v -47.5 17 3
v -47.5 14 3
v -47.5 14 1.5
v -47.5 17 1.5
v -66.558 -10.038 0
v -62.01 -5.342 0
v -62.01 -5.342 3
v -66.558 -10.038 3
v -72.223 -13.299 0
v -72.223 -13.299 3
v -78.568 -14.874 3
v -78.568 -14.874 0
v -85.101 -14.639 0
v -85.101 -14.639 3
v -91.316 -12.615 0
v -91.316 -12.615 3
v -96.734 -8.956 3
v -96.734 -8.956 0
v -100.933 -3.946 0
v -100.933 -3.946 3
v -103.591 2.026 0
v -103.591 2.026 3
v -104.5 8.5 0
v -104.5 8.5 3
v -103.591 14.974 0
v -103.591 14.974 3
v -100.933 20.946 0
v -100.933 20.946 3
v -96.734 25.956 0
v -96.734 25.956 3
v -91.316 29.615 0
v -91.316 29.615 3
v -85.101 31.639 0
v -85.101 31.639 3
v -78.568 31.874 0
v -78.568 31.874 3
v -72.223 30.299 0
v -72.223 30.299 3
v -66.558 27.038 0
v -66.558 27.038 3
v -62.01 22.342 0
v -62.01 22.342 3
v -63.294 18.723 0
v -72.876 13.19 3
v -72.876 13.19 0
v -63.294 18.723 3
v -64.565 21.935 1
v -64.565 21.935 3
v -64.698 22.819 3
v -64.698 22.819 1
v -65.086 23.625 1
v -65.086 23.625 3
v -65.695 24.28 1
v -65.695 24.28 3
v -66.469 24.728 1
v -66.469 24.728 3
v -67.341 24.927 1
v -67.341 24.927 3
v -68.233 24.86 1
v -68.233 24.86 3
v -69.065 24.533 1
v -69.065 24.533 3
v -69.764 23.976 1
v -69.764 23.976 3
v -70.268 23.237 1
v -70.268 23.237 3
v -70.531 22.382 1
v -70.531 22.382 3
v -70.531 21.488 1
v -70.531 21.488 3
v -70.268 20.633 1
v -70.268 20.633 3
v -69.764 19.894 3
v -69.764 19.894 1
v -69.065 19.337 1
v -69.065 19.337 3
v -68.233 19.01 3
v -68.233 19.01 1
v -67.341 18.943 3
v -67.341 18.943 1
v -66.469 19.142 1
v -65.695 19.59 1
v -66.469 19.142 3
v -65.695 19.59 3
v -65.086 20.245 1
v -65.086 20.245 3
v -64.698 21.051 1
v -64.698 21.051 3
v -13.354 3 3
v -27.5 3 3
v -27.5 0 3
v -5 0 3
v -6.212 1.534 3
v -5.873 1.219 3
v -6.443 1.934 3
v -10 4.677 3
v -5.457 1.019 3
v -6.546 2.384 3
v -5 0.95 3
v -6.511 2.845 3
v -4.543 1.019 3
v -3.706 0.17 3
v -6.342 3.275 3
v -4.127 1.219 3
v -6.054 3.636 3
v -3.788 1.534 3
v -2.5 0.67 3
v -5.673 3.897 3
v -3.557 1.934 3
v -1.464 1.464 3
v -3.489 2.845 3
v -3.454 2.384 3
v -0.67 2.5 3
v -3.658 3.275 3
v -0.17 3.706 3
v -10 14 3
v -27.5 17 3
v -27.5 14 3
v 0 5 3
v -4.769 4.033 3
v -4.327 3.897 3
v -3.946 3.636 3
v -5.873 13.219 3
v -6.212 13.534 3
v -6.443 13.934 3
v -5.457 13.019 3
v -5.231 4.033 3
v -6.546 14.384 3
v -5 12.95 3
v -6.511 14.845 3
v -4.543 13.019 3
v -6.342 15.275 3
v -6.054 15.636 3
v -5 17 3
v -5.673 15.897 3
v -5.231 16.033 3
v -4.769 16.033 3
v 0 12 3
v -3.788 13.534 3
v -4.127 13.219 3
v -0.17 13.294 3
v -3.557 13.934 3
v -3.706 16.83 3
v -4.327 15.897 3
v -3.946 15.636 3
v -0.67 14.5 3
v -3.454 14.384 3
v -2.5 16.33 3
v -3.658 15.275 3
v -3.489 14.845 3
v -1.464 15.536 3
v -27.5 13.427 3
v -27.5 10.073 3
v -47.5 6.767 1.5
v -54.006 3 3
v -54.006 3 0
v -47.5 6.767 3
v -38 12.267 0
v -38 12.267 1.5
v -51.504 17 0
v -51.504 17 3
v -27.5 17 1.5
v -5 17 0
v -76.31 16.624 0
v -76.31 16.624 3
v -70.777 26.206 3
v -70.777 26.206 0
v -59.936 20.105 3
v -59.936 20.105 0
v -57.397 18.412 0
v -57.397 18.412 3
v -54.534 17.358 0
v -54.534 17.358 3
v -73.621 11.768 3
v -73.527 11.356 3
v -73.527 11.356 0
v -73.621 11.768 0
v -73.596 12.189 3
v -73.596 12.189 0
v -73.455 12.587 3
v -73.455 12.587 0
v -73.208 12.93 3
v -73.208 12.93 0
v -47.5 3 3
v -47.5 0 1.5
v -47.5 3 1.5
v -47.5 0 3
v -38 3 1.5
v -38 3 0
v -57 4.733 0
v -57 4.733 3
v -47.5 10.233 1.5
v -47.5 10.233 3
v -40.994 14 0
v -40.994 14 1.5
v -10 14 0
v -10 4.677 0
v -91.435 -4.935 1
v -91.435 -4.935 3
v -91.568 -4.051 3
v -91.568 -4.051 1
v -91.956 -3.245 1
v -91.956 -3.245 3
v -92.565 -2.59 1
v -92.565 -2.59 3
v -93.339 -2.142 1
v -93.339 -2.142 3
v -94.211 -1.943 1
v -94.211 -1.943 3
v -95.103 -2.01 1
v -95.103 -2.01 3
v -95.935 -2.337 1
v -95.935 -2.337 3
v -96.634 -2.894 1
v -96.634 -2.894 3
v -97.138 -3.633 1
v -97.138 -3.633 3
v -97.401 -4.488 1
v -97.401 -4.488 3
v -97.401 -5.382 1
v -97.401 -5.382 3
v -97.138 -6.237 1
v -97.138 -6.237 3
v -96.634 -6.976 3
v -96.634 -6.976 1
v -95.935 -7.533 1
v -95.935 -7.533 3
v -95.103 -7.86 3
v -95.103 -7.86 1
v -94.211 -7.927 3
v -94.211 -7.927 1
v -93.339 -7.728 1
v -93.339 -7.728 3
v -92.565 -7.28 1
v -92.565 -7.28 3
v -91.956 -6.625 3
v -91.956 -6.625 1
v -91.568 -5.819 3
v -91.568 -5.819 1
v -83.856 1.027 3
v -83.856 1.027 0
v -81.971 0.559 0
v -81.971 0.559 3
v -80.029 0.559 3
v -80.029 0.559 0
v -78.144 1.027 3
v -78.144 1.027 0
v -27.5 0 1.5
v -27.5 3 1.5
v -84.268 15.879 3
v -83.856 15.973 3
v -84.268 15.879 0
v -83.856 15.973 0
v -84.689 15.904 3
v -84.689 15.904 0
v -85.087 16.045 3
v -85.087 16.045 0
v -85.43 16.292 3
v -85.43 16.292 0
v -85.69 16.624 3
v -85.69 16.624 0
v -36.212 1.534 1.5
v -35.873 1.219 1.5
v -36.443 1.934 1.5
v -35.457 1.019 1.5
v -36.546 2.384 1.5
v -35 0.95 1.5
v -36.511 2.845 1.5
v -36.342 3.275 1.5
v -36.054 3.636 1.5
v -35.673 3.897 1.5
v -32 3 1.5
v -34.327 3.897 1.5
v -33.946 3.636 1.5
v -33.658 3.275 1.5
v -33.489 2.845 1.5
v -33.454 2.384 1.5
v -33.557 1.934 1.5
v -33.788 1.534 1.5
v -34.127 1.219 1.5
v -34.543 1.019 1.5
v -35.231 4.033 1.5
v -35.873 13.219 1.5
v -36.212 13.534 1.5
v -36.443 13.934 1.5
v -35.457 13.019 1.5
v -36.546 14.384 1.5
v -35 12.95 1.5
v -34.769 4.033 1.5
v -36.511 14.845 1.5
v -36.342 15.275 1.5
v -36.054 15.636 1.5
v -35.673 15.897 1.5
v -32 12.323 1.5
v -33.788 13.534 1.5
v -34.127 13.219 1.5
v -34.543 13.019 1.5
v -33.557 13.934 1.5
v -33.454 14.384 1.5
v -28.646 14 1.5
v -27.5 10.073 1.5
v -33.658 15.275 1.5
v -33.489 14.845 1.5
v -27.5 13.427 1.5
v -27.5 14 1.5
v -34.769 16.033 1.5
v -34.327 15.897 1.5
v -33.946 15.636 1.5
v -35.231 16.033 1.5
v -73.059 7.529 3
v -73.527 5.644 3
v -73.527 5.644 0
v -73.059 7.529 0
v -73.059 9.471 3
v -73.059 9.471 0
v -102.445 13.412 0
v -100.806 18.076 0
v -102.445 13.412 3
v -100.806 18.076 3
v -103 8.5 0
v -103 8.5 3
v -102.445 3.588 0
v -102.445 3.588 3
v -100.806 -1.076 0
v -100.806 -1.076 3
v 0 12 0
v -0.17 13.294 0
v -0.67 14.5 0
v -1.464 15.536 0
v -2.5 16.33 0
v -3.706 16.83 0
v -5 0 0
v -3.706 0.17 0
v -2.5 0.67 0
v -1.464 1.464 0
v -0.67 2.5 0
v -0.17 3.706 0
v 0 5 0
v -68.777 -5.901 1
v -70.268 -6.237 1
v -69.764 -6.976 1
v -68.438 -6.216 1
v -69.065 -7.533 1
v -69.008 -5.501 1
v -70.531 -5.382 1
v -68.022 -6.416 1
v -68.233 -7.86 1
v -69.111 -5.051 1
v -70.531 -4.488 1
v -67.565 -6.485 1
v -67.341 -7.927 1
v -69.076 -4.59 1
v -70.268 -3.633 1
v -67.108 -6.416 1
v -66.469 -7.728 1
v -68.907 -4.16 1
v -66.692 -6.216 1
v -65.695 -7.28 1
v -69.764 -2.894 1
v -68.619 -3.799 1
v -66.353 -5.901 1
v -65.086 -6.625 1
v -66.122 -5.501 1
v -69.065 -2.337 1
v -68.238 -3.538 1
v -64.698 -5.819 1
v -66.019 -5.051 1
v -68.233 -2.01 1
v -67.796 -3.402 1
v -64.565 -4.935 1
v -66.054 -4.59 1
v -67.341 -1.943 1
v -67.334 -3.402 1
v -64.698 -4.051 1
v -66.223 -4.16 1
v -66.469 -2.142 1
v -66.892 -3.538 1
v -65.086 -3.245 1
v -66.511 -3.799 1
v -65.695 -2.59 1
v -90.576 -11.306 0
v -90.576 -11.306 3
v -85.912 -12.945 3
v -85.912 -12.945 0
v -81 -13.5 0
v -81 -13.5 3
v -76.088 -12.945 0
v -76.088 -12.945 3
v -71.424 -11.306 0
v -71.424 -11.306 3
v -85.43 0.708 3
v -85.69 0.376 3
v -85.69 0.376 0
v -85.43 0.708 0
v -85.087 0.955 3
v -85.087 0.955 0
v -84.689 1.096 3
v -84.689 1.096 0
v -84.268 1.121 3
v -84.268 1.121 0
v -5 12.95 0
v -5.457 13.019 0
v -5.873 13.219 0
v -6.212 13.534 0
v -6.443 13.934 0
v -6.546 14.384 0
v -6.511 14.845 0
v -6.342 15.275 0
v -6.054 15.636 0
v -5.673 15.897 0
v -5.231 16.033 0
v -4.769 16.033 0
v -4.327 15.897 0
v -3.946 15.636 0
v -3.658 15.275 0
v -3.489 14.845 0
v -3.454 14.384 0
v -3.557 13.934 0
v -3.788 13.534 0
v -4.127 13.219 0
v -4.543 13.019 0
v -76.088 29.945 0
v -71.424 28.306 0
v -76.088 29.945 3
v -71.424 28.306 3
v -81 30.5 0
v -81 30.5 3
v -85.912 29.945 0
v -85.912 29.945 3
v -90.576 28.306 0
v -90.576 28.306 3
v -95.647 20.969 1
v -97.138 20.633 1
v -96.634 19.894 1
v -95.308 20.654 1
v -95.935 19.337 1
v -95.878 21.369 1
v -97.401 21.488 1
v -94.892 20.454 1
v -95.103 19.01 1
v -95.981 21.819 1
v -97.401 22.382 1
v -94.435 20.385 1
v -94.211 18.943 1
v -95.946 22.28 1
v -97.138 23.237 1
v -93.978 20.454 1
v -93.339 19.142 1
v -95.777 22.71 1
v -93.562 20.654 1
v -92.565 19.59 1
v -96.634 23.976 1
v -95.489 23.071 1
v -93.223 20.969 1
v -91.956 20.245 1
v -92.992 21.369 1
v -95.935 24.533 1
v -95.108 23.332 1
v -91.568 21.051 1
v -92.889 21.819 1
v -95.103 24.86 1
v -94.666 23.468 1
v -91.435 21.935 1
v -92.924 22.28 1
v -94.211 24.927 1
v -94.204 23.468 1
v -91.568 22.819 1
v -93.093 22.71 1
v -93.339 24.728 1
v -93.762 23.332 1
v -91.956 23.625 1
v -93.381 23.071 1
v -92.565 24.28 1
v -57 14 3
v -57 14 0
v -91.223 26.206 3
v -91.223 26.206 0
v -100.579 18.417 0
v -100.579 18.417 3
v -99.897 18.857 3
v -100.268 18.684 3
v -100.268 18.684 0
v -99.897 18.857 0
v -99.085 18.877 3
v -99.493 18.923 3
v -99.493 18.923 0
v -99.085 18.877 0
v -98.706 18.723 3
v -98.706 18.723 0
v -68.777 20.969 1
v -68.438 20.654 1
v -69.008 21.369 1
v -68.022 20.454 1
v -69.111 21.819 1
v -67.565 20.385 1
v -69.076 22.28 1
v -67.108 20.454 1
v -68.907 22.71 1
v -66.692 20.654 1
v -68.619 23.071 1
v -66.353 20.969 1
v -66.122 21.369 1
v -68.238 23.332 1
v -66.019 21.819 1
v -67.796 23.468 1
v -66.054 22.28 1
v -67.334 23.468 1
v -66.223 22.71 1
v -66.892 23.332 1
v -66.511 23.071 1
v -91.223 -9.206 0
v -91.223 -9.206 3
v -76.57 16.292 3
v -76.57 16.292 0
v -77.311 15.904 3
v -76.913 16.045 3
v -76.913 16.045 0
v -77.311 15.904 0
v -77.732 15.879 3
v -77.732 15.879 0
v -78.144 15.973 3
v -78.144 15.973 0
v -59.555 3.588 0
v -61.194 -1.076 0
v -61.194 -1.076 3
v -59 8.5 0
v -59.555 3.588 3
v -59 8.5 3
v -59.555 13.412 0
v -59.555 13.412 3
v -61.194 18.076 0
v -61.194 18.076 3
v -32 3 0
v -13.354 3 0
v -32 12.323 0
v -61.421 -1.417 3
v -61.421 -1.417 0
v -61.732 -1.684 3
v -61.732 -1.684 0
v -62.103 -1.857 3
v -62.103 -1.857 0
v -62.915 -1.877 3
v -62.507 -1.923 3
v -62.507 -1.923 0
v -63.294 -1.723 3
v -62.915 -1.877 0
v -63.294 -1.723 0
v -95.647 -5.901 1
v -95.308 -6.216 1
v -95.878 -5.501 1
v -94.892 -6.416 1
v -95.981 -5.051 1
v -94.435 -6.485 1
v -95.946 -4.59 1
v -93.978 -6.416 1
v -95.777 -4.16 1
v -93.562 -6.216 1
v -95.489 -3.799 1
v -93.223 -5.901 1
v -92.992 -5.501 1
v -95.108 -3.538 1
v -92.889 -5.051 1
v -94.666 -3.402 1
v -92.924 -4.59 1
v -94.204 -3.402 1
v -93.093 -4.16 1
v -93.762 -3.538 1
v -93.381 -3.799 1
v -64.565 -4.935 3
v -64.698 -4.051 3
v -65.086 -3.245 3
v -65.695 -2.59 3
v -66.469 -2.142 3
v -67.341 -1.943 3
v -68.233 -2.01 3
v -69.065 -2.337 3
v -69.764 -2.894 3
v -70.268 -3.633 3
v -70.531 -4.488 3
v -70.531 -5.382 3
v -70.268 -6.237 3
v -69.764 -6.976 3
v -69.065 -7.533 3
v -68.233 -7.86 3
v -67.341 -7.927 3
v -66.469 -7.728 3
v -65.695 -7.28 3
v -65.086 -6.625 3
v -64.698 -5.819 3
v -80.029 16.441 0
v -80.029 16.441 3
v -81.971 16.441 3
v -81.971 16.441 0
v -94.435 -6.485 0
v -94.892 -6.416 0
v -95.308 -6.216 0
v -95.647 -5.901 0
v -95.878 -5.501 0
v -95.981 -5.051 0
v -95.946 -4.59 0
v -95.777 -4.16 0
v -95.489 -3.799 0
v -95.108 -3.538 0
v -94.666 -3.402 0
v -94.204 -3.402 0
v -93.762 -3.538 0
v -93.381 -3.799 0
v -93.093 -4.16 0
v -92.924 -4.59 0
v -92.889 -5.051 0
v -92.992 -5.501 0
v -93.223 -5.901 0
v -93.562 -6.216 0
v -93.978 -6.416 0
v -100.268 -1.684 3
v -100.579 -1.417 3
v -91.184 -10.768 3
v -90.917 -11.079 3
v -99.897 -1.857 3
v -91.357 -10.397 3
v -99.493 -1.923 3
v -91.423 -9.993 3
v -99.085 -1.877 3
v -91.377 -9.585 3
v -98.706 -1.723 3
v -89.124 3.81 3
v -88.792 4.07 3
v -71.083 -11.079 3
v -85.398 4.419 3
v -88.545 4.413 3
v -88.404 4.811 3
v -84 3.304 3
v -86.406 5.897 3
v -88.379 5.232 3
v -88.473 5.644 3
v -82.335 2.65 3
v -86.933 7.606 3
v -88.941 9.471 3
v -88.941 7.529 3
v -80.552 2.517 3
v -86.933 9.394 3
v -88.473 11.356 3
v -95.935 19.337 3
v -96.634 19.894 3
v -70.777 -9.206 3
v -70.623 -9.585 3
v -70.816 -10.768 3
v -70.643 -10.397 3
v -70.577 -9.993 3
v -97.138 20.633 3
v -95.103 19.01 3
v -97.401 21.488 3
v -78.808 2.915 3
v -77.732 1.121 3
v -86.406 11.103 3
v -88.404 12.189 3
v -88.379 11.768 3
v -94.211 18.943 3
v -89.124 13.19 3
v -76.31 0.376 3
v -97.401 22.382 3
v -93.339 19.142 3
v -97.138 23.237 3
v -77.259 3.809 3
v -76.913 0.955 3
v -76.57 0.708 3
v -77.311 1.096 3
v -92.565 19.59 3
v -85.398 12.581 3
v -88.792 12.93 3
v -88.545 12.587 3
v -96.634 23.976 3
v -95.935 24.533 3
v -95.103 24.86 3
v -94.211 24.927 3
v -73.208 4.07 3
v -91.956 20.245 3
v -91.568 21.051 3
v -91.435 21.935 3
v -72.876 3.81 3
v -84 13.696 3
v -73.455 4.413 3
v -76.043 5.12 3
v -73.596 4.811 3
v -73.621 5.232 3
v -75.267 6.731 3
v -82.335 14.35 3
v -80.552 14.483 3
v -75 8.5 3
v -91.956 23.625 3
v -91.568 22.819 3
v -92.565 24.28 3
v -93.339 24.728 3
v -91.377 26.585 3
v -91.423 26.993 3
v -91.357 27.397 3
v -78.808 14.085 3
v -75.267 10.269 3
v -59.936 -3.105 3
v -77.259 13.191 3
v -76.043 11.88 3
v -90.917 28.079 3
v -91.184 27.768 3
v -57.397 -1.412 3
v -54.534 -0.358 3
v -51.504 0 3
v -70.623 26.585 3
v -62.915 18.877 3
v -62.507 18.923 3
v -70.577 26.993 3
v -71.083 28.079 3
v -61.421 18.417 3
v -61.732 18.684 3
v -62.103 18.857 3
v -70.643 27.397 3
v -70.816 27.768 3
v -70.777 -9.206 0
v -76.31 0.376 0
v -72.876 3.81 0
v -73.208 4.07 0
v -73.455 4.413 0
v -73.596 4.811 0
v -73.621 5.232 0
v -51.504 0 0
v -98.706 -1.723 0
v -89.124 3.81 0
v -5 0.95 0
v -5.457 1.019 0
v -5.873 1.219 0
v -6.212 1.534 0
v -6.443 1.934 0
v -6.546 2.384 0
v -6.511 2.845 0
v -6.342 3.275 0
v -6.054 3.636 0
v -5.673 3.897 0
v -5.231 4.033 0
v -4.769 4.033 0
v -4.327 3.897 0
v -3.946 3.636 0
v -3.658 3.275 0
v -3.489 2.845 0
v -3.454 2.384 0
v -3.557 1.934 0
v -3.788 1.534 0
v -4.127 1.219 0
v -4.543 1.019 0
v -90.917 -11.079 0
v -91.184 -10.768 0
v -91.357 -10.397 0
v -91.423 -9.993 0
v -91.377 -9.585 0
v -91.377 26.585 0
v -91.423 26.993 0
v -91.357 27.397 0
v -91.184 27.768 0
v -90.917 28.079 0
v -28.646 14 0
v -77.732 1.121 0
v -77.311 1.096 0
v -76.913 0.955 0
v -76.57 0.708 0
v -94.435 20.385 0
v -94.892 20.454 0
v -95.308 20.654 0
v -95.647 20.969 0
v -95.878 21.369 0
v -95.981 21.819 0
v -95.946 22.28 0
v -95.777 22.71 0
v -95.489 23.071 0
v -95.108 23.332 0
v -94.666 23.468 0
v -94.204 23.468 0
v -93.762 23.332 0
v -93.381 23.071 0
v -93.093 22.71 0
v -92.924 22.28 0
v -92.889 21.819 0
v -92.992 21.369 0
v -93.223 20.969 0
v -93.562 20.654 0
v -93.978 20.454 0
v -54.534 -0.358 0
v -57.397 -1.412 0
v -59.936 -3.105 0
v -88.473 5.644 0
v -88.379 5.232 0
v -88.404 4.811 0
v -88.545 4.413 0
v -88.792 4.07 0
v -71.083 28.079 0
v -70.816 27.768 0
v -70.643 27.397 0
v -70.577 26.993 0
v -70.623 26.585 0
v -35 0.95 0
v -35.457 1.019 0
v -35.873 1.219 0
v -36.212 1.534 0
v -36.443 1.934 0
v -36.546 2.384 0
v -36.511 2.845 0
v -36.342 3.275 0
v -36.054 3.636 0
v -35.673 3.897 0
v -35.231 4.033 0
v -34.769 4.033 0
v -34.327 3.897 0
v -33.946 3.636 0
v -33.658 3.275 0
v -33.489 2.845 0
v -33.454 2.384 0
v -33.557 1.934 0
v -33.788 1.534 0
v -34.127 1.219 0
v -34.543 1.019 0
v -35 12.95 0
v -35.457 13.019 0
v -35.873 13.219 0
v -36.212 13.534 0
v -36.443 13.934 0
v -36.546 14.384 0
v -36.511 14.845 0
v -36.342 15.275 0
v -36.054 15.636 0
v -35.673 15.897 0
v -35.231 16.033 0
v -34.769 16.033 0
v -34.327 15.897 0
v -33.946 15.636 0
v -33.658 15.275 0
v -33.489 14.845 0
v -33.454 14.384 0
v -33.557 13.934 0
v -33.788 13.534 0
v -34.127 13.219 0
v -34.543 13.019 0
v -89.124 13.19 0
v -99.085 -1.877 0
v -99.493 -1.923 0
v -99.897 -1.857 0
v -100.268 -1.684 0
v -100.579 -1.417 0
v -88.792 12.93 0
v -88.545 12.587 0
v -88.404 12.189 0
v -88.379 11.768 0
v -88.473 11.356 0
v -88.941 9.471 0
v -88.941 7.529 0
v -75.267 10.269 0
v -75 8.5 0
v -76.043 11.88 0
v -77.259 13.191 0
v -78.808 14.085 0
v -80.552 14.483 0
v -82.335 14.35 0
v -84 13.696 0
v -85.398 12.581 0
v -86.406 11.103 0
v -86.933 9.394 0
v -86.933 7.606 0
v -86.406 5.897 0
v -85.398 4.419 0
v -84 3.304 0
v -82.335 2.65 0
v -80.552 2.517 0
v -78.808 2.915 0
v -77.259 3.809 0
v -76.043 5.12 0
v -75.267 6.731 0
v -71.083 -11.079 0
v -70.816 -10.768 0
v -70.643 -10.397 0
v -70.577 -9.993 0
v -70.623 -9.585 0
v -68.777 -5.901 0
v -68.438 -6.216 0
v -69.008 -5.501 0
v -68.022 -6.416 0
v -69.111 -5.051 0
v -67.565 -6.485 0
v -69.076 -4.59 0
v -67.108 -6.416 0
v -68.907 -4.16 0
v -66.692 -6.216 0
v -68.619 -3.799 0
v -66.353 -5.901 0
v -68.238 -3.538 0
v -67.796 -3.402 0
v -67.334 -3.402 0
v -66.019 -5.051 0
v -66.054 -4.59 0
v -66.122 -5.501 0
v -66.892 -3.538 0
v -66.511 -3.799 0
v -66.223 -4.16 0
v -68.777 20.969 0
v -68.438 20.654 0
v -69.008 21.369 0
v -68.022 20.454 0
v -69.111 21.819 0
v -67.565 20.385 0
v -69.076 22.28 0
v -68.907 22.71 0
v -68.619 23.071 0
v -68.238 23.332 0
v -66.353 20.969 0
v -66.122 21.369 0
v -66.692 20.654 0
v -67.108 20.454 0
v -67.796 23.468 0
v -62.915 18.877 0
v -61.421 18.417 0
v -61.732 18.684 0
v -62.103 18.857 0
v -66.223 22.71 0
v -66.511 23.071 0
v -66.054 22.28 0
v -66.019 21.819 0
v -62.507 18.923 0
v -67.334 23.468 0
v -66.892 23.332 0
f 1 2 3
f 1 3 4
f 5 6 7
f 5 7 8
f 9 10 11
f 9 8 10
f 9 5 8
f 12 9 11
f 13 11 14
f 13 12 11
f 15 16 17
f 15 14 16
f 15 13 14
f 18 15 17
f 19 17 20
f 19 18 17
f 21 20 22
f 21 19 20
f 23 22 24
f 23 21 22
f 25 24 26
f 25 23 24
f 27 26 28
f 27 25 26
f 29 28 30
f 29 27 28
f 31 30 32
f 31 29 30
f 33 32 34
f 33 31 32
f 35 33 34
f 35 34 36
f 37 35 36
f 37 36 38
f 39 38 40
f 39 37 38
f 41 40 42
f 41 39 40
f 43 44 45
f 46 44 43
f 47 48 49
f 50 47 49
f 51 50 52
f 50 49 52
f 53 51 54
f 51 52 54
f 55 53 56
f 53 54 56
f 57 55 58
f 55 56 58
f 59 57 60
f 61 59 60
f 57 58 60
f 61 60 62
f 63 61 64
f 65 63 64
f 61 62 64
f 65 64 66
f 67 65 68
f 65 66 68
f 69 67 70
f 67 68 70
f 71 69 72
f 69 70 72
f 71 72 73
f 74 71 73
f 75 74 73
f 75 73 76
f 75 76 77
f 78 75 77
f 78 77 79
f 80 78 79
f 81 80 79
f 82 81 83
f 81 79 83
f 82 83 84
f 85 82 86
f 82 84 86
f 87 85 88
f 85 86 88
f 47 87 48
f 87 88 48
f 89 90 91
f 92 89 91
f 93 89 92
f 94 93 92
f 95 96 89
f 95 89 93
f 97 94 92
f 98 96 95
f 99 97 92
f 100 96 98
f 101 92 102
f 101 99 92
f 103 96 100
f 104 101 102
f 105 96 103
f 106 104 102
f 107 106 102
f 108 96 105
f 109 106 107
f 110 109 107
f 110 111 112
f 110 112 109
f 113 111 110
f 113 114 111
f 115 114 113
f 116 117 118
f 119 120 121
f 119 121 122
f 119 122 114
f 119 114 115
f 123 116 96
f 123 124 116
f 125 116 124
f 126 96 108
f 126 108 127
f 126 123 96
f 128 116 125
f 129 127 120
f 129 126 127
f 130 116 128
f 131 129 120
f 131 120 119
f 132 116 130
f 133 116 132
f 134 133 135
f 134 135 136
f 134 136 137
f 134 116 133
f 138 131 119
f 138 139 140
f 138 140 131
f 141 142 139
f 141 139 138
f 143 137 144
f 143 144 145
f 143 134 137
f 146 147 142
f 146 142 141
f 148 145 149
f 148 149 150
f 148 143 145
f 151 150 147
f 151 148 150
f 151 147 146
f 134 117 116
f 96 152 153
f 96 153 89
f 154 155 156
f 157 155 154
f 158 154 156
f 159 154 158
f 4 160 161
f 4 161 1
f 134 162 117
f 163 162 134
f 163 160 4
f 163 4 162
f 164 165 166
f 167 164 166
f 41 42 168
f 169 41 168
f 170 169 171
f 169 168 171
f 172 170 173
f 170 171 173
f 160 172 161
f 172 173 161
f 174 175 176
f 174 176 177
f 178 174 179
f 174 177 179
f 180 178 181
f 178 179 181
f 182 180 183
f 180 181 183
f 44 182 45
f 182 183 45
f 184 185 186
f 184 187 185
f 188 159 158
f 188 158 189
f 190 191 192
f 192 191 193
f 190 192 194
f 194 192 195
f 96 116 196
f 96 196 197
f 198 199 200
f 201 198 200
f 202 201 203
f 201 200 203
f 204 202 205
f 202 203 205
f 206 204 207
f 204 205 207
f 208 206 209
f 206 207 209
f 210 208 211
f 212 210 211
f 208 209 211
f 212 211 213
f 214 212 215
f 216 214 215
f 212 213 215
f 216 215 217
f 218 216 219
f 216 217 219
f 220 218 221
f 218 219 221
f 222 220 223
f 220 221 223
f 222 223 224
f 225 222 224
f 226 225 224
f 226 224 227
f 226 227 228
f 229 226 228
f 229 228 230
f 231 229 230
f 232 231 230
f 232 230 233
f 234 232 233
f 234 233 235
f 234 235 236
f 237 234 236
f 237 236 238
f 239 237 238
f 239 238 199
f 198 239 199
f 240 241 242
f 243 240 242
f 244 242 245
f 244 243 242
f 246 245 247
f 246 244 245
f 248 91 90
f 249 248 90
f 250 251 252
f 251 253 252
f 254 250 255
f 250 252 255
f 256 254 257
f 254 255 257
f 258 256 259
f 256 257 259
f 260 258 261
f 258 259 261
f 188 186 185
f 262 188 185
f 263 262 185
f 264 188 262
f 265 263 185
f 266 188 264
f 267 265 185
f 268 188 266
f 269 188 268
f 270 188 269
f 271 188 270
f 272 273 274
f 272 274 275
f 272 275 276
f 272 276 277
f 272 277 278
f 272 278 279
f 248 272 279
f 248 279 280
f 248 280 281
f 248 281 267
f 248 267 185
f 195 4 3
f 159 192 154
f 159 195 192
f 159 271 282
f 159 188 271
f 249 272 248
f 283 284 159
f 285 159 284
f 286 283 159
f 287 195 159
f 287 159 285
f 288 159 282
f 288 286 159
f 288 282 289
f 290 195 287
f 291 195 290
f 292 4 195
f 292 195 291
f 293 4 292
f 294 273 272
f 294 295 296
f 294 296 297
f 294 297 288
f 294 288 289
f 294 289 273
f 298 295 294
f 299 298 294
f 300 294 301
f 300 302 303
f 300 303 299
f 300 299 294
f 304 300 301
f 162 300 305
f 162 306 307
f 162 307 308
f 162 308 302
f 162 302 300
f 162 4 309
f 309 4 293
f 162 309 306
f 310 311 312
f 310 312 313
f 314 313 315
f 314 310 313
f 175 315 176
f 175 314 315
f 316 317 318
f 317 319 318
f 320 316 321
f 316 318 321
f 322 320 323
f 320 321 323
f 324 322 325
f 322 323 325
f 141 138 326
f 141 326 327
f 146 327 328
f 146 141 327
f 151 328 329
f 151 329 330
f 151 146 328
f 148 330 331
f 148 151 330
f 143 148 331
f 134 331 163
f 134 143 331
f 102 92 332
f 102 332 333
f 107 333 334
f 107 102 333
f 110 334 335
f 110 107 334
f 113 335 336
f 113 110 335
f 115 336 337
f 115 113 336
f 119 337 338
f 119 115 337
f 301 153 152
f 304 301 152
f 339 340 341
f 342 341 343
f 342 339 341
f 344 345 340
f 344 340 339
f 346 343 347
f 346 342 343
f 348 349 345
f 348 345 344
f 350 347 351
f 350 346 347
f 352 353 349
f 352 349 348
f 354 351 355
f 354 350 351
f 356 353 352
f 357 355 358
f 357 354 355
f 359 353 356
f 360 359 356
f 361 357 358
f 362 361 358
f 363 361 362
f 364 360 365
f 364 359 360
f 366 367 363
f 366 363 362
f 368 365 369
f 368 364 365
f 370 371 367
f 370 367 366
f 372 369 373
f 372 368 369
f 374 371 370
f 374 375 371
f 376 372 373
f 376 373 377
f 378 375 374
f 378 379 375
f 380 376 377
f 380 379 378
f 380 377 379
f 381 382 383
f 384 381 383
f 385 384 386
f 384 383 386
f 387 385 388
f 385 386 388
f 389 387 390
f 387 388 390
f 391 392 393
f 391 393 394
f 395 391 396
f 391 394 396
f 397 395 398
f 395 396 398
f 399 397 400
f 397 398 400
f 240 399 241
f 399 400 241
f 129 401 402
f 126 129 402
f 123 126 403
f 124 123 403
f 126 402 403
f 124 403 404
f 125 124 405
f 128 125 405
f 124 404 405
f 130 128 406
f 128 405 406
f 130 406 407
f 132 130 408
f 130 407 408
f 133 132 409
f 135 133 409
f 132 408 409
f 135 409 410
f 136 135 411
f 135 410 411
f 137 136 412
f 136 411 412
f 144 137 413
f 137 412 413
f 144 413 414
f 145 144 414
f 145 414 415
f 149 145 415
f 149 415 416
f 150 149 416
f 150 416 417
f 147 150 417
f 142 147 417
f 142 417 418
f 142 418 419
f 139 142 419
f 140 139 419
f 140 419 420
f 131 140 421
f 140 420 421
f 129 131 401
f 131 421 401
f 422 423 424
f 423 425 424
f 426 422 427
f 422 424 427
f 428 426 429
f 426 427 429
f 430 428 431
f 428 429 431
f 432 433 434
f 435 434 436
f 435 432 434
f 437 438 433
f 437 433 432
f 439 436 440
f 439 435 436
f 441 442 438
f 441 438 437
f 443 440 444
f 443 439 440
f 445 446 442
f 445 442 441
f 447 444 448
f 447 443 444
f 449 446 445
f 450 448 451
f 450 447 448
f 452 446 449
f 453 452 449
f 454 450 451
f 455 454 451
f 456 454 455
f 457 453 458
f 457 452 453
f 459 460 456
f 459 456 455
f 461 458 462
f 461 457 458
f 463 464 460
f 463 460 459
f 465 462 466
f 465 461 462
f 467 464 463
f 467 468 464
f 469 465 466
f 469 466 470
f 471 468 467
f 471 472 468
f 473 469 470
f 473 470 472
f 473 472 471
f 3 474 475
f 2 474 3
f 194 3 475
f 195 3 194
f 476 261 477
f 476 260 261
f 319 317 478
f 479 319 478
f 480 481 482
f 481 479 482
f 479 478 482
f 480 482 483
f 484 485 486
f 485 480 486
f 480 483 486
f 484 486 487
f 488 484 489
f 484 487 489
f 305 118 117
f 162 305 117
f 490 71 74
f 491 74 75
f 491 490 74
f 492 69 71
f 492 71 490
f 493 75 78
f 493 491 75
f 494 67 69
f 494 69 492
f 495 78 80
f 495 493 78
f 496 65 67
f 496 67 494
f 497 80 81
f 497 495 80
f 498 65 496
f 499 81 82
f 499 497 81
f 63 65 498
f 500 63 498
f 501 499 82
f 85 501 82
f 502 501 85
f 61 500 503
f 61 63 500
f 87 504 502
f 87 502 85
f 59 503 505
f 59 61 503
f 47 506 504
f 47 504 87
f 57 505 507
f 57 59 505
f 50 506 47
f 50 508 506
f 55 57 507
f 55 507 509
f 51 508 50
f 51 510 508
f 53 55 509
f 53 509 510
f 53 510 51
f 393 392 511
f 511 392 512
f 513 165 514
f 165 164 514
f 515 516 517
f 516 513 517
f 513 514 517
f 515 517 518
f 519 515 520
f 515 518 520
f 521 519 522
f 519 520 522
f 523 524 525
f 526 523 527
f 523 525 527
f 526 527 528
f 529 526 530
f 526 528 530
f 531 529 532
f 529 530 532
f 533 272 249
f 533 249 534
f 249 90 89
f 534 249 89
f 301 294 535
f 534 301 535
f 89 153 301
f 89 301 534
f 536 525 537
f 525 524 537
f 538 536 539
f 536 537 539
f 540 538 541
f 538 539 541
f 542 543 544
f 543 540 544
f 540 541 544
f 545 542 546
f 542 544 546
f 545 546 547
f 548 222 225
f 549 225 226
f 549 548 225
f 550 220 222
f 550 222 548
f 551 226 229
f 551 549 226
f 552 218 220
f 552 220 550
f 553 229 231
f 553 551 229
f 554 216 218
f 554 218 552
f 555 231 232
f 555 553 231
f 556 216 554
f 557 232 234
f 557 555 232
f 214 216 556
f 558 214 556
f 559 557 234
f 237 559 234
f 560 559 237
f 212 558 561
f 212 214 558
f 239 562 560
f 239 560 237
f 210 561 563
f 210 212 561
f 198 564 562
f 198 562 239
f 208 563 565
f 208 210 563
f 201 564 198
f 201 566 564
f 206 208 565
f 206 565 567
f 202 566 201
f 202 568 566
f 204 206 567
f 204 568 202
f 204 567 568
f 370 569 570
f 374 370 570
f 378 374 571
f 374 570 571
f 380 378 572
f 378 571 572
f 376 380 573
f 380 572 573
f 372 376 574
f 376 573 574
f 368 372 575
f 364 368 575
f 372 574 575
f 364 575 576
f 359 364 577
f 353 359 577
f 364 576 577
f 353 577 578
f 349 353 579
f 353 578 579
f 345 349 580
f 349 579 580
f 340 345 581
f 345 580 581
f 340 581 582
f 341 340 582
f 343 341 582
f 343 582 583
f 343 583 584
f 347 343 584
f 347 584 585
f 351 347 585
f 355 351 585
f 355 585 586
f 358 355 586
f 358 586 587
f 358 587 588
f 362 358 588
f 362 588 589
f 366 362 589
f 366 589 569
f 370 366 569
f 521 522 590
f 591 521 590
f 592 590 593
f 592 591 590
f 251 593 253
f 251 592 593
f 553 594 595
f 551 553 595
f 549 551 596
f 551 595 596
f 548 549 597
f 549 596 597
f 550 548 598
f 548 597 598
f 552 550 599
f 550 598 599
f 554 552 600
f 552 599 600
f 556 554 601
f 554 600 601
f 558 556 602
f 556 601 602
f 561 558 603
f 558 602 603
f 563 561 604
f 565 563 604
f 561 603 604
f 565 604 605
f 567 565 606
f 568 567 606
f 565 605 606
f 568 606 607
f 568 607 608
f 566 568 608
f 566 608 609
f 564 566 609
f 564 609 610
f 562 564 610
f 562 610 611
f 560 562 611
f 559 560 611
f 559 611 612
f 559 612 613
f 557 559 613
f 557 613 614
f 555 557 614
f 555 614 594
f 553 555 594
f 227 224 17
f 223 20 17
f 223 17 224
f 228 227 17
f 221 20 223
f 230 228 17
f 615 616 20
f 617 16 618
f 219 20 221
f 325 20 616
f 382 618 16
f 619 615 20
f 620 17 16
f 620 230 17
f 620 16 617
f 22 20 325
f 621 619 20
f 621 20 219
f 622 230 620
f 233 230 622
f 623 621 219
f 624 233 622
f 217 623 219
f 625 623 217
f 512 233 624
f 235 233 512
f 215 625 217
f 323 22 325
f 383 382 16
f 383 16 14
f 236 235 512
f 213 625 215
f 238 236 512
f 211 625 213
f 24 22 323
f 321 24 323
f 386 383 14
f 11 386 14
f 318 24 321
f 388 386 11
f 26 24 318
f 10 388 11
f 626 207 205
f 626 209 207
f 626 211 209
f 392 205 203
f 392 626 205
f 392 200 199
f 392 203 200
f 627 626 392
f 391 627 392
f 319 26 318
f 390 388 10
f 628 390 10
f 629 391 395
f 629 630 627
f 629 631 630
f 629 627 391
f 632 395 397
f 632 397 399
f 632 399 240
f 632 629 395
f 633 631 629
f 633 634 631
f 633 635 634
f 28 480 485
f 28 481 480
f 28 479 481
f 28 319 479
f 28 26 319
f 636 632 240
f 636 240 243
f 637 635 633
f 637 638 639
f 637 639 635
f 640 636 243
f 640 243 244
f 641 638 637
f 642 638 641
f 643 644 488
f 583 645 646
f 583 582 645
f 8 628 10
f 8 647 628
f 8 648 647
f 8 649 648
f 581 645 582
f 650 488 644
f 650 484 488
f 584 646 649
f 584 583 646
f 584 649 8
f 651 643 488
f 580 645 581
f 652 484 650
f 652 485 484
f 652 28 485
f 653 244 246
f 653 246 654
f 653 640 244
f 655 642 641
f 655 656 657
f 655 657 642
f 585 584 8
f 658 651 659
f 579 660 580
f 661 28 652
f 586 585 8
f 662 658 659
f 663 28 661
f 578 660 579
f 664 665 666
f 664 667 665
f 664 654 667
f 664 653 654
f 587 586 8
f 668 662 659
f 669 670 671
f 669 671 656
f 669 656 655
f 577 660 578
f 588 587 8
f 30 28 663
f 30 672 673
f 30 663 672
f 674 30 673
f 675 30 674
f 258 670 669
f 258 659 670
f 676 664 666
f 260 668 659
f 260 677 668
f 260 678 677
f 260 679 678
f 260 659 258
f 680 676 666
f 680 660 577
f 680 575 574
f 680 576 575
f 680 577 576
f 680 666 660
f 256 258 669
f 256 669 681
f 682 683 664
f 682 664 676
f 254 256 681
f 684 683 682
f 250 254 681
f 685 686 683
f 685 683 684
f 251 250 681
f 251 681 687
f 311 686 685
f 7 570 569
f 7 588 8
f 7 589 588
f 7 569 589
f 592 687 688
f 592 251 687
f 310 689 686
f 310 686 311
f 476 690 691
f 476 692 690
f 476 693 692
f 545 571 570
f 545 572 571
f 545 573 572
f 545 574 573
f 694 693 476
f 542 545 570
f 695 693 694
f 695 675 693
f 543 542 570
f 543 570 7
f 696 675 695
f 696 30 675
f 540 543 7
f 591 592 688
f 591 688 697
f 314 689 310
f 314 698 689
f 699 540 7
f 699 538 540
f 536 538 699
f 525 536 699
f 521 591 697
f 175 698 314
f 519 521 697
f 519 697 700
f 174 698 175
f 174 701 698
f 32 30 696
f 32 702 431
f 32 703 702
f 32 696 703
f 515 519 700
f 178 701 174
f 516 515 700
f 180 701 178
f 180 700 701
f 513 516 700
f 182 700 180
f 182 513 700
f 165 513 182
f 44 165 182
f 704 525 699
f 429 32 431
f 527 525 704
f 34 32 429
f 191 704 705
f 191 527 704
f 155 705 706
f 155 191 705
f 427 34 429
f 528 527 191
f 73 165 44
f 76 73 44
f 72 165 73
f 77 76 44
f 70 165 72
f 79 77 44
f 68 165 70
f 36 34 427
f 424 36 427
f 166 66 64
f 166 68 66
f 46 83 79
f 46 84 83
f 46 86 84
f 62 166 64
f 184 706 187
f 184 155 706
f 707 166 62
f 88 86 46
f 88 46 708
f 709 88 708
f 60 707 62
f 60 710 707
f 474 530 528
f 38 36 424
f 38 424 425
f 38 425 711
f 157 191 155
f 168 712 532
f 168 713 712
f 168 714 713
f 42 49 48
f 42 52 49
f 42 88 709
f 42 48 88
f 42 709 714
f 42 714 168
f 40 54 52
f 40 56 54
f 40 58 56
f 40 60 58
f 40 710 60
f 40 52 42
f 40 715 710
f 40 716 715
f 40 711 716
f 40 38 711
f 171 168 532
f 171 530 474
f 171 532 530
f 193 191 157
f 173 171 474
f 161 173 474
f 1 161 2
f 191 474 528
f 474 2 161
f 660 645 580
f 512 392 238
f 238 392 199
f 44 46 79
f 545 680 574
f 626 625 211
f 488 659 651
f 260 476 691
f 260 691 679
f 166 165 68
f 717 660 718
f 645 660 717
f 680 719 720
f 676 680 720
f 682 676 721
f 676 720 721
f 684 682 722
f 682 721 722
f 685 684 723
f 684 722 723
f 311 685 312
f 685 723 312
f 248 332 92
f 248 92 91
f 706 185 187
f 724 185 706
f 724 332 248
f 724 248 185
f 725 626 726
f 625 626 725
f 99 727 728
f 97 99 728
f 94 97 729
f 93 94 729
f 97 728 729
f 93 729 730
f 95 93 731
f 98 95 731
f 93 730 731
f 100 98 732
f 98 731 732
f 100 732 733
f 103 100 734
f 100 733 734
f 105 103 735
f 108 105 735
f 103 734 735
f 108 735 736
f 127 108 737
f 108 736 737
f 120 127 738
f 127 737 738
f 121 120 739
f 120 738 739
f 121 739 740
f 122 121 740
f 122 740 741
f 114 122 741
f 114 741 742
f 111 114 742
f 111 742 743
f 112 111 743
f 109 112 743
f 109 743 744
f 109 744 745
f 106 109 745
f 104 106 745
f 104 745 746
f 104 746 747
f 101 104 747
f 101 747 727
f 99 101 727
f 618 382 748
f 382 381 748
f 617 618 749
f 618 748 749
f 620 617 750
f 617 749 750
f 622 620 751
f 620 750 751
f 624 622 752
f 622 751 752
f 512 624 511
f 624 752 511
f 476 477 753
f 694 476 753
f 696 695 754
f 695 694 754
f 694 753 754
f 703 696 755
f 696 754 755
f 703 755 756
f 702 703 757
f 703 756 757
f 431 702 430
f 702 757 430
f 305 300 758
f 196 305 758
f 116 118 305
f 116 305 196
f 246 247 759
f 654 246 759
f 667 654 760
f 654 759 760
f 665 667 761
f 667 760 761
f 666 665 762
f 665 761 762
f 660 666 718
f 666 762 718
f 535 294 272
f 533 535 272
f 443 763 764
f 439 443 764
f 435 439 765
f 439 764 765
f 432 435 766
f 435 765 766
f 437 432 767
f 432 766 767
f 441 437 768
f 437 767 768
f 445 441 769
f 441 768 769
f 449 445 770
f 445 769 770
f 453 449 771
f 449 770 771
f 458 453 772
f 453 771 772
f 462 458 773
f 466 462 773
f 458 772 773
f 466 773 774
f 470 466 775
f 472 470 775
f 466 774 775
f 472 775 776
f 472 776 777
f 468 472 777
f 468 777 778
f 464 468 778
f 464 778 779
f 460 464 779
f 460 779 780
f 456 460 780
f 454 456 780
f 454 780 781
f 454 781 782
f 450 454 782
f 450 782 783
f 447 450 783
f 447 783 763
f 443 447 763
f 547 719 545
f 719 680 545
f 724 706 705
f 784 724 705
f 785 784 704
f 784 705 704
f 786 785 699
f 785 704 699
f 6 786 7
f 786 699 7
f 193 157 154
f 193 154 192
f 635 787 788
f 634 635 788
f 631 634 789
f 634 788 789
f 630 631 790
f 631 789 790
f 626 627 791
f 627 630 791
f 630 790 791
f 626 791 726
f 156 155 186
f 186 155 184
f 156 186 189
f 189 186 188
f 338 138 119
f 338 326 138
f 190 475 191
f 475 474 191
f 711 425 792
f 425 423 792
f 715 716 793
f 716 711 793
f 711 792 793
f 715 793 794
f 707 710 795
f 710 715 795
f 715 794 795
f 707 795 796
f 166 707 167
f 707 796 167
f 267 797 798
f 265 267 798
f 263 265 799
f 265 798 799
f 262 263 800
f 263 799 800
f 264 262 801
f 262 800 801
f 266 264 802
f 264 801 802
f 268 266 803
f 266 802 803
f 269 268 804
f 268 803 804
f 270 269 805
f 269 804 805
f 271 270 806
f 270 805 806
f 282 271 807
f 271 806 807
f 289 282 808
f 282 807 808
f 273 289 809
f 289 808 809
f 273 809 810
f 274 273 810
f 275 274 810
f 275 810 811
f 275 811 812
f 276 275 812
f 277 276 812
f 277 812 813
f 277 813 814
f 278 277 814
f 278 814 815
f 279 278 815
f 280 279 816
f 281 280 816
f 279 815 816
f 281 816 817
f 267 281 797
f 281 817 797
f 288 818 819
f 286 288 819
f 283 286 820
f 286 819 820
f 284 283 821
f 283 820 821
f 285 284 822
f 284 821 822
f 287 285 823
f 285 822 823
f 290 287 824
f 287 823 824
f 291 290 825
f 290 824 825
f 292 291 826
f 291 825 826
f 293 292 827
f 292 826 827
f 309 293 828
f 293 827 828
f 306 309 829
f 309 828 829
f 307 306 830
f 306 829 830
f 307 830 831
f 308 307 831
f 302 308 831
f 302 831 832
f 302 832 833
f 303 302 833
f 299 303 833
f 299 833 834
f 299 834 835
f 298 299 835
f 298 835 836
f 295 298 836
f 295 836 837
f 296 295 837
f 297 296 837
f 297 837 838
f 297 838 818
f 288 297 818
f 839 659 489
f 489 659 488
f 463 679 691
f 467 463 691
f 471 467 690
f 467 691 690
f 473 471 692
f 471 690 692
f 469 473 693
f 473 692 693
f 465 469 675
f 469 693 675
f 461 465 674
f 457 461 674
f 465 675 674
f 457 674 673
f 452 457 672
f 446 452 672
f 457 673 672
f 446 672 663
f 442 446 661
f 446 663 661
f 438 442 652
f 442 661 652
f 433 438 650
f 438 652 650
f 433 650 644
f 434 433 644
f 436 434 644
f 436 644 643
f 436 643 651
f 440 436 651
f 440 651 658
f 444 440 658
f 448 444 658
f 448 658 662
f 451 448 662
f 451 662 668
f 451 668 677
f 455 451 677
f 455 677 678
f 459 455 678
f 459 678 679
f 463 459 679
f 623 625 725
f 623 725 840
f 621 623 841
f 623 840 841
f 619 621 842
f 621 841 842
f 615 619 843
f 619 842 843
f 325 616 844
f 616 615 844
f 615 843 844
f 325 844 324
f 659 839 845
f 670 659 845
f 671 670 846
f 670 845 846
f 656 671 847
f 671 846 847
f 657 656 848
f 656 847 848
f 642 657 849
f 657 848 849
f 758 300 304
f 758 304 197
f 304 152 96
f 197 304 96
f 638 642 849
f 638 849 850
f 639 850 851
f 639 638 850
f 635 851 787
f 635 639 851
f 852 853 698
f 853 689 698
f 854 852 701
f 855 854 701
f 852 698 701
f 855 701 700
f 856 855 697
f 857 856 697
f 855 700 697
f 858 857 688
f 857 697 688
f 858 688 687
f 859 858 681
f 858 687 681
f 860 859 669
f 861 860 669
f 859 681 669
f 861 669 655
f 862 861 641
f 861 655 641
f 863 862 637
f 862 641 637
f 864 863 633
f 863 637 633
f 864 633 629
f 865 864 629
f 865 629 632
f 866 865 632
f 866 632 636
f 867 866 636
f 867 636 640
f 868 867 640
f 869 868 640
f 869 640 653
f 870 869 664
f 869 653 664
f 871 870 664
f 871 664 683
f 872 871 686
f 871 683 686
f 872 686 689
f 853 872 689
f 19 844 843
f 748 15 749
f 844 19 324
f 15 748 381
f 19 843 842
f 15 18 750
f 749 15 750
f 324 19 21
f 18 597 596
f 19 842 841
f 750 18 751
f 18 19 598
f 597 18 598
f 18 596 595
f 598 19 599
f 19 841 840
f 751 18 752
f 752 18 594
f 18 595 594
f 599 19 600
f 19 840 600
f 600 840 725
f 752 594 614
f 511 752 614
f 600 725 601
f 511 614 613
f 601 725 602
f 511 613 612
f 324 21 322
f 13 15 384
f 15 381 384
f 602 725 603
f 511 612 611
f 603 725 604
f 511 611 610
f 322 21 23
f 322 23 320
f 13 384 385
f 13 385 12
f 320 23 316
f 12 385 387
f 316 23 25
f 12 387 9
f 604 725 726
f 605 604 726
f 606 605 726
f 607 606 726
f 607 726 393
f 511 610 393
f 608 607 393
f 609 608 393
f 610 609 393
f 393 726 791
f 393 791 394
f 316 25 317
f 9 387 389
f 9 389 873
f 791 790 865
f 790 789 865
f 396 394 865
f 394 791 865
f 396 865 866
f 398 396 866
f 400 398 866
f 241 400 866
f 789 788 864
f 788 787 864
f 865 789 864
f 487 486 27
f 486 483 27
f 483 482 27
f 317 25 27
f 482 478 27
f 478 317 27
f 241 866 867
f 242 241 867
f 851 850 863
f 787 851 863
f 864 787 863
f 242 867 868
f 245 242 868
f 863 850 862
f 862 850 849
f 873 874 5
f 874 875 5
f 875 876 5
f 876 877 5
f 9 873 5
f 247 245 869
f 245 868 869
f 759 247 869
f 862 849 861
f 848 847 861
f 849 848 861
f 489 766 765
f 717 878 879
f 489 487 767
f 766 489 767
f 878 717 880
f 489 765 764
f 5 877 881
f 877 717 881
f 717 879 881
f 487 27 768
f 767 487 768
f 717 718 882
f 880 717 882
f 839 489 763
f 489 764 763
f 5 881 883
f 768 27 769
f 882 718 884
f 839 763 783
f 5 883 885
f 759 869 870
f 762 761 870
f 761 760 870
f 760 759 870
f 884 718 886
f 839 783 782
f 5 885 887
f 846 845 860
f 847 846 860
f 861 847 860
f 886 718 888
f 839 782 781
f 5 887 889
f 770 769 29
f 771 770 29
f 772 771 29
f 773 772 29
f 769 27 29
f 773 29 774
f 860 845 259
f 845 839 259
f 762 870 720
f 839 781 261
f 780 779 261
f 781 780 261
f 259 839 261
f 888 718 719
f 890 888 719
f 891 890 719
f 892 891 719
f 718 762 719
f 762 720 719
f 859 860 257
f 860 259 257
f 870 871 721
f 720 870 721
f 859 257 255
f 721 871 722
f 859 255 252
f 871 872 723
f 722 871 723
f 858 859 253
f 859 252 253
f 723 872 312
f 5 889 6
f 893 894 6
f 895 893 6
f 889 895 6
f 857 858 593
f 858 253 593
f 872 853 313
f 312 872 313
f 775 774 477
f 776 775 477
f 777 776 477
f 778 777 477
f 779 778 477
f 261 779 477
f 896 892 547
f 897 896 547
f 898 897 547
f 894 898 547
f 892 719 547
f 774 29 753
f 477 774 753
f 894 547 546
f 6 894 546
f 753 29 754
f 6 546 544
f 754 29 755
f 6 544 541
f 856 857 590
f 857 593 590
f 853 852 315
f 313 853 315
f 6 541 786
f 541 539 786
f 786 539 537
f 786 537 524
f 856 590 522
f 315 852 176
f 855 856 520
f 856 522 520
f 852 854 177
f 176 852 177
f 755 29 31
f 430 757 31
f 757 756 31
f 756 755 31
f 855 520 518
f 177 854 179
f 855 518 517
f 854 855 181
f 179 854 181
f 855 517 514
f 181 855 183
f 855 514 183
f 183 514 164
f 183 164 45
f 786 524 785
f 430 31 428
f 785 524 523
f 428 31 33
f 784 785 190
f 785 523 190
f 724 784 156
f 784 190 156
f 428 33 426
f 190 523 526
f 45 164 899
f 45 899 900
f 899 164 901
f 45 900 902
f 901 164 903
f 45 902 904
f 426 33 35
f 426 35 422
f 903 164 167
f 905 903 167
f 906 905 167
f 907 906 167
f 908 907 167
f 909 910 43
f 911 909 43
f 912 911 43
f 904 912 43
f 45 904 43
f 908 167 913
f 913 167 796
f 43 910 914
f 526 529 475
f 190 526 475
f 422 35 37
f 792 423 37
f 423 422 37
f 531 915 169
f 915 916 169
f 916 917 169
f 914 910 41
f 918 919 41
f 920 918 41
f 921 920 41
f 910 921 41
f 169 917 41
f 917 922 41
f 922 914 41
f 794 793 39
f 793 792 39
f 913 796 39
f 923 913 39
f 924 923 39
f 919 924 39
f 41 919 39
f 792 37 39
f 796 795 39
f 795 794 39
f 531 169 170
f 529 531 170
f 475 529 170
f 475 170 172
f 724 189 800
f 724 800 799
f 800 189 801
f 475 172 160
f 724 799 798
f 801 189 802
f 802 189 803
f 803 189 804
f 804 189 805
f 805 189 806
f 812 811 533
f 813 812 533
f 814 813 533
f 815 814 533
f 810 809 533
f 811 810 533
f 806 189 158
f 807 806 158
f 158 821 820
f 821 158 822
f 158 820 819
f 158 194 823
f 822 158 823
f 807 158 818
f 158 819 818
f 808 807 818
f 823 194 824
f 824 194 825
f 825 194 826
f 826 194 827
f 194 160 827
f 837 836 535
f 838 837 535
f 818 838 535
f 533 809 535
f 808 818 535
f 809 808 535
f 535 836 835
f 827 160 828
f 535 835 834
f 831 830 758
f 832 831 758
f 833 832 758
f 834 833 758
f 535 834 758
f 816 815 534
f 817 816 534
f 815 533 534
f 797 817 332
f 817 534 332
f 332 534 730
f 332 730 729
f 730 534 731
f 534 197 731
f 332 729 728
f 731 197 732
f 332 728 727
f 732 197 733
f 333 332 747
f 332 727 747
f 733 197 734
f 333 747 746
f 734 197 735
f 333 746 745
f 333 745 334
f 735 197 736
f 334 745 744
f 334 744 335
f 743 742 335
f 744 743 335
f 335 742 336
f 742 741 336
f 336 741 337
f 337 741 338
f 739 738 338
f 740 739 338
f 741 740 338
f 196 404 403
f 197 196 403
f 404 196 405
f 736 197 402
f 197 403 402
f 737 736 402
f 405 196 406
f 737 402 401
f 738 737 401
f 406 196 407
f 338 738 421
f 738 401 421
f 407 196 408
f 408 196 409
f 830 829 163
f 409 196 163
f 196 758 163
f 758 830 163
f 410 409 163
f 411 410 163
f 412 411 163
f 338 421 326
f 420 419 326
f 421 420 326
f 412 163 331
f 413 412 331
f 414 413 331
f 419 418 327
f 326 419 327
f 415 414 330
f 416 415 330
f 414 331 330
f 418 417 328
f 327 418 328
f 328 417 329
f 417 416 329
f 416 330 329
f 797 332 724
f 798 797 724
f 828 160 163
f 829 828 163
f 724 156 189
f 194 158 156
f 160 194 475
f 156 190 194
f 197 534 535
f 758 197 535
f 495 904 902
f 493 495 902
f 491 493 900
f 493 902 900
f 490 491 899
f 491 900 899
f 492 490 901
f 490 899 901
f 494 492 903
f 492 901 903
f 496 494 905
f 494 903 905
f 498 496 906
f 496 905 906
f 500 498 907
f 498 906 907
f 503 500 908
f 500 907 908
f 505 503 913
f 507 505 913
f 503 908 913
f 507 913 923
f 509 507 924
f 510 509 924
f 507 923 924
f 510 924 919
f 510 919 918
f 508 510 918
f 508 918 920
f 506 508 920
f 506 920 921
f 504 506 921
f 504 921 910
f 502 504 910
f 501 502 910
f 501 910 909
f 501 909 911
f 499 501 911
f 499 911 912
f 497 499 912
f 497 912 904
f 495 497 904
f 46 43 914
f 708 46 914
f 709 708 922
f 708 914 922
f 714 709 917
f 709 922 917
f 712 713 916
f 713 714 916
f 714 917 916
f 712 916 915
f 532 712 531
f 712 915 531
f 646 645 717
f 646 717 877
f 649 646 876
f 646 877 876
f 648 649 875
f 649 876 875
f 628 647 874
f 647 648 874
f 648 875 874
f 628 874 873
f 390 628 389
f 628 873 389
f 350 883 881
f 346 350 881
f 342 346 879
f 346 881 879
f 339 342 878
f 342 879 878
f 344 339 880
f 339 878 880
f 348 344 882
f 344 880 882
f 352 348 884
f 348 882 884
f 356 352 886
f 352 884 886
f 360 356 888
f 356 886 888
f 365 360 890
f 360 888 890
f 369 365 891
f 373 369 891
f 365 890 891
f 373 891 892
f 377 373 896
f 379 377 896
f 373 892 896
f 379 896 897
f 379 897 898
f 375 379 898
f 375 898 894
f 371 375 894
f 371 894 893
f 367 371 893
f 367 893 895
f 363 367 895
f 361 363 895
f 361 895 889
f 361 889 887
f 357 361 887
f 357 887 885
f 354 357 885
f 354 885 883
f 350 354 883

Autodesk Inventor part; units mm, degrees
ref_plane "YZ Plane" through (0, 0, 0) normal (1, 0, 0) x (0, 1, 0)
ref_plane "XZ Plane" through (0, 0, 0) normal (0, 1, 0) x (-1, 0, 0)
ref_plane "XY Plane" through (0, 0, 0) normal (0, 0, 1) x (1, 0, 0)
sketch "スケッチ1" plane through (0, 0, 0) normal (0, 0, 1) x (1, 0, 0)
  line L0 (0, 0) -> (-81, 0)
  line L1 (-81, 0) -> (-81, 17)
  line L2 (-81, 17) -> (0, 17)
  line L3 (0, 17) -> (0, 0)
  line L4 (-81, 8.5) -> (0, 8.5)
  circle A0 centre (-81, 8.5) radius 23.5
  point P0 (-59.0911, 17)
  point P1 (-59.0911, 0)
  dimension "d0" = 17
  dimension "d28" = 47
  dimension "d29" = 81
extrude "押し出し1" add sketch "スケッチ1" along normal blind 3
sketch "スケッチ2" plane through (0, 0, 3) normal (0, 0, 1) x (1, 0, 0)
  line L0 (0, 0) -> (0, 17) projected
  line L1 (0, 8.5) -> (-59.0911, 8.5)
  line L2 (0, 17) -> (-59.0911, 17) projected
  line L3 (-5, 17) -> (-5, 0)
  line L4 (-35, 17) -> (-35, 0)
  line L5 (-59.0911, 0) -> (0, 0) projected
  arc A0 (-59.0911, 17) -> (-59.0911, 0) centre (-81, 8.5) ccw projected
  line L6 (-59.0911, 17) -> (-59.0911, 0)
  point P0 (-5, 14.5)
  point P1 (-35, 14.5)
  point P2 (-5, 2.5)
  point P3 (-35, 2.5)
  dimension "d4" = 5
  dimension "d5" = 30
  dimension "d6" = 6
  dimension "d7" = 6
hole "穴1" at (-5, 14.5, 3) at (-35, 14.5, 3) at (-35, 2.5, 3) at (-5, 2.5, 3) direction (0, 0, -1) diameter 3.1 depth 20 tip angle 118
sketch "スケッチ5" plane through (0, 0, 3) normal (0, 0, 1) x (1, 0, 0)
  arc A0 (-59.0911, 17) -> (-59.0911, 0) centre (-81, 8.5) ccw projected
  line L0 (-59.0911, 0) -> (0, 0) projected
  line L1 (0, 0) -> (0, 17) projected
  circle A1 centre (-81, 8.5) radius 19
  line L2 (-81, 8.5) -> (-81, 27.5)
  line L3 (-81, 8.5) -> (-94.435, 21.935)
  point P0 (-94.435, -4.935)
  point P1 (-67.565, -4.935)
  point P2 (-67.565, 21.935)
  dimension "d80" = 38
  dimension "d81" = 45
  dimension "d84" = 360
hole "穴3" at (-67.565, 21.935, 3) at (-67.565, -4.935, 3) at (-94.435, -4.935, 3) at (-94.435, 21.935, 3) direction (0, 0, -1) diameter 3.1 end through all
sketch "スケッチ6" plane through (0, 0, 3) normal (0, 0, 1) x (1, 0, 0)
  arc A0 (-59.0911, 17) -> (-59.0911, 0) centre (-81, 8.5) ccw projected
  circle A1 centre (-81, 8.5) radius 6
  point P0 (0, 0)
  dimension "d43" = 12
extrude "押し出し3" cut sketch "スケッチ6" against normal blind 3
sketch "スケッチ7" plane through (0, 0, 3) normal (0, 0, 1) x (1, 0, 0)
  circle A0 centre (-94.435, -4.935) radius 1.55 projected
  circle A1 centre (-67.565, -4.935) radius 1.55 projected
  circle A2 centre (-67.565, -4.935) radius 3
  circle A3 centre (-94.435, -4.935) radius 3
  circle A4 centre (-94.435, 21.935) radius 1.55 projected
  circle A5 centre (-94.435, 21.935) radius 3
  circle A6 centre (-67.565, 21.935) radius 1.55 projected
  circle A7 centre (-67.565, 21.935) radius 3
  point P0 (0, 0)
  dimension "d86" = 6
  dimension "d87" = 6
  dimension "d88" = 6
  dimension "d89" = 6
extrude "押し出し4" cut sketch "スケッチ7" against normal blind 2 contours A0 | A1 | A2 | A3 | A4 | A5 | A6 | A7
sketch "スケッチ8" plane through (0, 0, 3) normal (0, 0, 1) x (1, 0, 0)
  line L0 (-81, 8.5) -> (-81, 30.5)
  line L1 (-81, 8.5) -> (-20.8346, 112.7096)
  line L2 (-77, 15.4282) -> (-20.8346, 112.7096)
  circle A0 centre (-81, 8.5) radius 22
  circle A1 centre (-81, 8.5) radius 8
  line L3 (0, 17) -> (-59.0911, 17) projected
  line L4 (-57, 17) -> (-57, -1.5)
  line L5 (-38, 17) -> (-38, 0)
  line L6 (-59.0911, 0) -> (0, 0) projected
  line L7 (-32, 17) -> (-32, 0)
  circle A2 centre (-35, 14.5) radius 1.55 projected
  line L8 (-10, 17) -> (-10, 0)
  line L9 (0, 0) -> (0, 17) projected
  line L10 (-57, 3) -> (0, 3)
  line L11 (-57, 14) -> (0, 14)
  line L12 (-57, 3) -> (-38, 14)
  line L13 (-57, 4.7332) -> (-40.9938, 14)
  line L14 (-54.0062, 3) -> (-38, 12.2668)
  line L15 (-32, 14) -> (-10, 3)
  line L16 (-32, 12.3229) -> (-13.3541, 3)
  line L17 (-28.6459, 14) -> (-10, 4.6771)
  line L18 (-85, 15.4282) -> (-141.1654, 112.7096)
  line L19 (-87.9282, 4.5) -> (-185.2096, -51.6654)
  line L20 (-81, 8.5) -> (-185.2096, 68.6654)
  line L21 (-77, 1.5718) -> (-20.8346, -95.7096)
  line L22 (-81, 8.5) -> (-141.1654, -95.7096)
  line L23 (-74.0718, 12.5) -> (23.2096, 68.6654)
  line L24 (-81, 8.5) -> (23.2096, -51.6654)
  circle A3 centre (-81, 8.5) radius 6 projected
  point P0 (-10, 14)
  point P1 (-32, 3)
  point P2 (-38, 3)
  point P3 (-87.9282, 12.5)
  point P4 (-85, 1.5718)
  point P5 (-74.0718, 4.5)
  point P6 (-85, 1.5718)
  point P7 (-92, -10.5526)
  point P8 (-70, -10.5526)
  point P9 (-77, 1.5718)
  point P10 (-74.0718, 4.5)
  point P11 (-61.9474, -2.5)
  point P12 (-61.9474, 19.5)
  point P13 (-74.0718, 12.5)
  point P14 (-92, 27.5526)
  point P15 (-85, 15.4282)
  point P16 (-70, 27.5526)
  point P17 (-87.9282, 12.5)
  point P18 (-100.0526, 19.5)
  point P19 (-100.0526, -2.5)
  point P20 (-87.9282, 4.5)
  dimension "d57" = 44
  dimension "d69" = 16
  dimension "d52" = 30
  dimension "d58" = 24
  dimension "d59" = 3
  dimension "d60" = 3
  dimension "d61" = 10
  dimension "d62" = 3
  dimension "d63" = 3
  dimension "d64" = 1.5
  dimension "d66" = 1.5
  dimension "d67" = 1.5
  dimension "d68" = 1.5
  dimension "d74" = 360
extrude "押し出し5" cut sketch "スケッチ8" against normal blind 3 contours A1 L18 A0 L0 | L0 A0 L1 A1 | A1 L19 A0 L20 | A1 L21 A0 L22 | A1 L23 A0 L24 | L8 L17 L11 | L16 L10 L7 | L11 L13 L4 | L5 L10 L14
fillet "フィレット1" radius 1.5 16 edges at (-100.0526, 19.5, 1.5) (-87.9282, 12.5, 1.5) (-85, 15.4282, 1.5) (-92, 27.5526, 1.5) (-70, 27.5526, 1.5) (-77, 15.4282, 1.5) (-74.0718, 12.5, 1.5) (-61.9474, 19.5, 1.5) (-74.0718, 4.5, 1.5) (-61.9474, -2.5, 1.5) (-70, -10.5526, 1.5) (-77, 1.5718, 1.5) (-85, 1.5718, 1.5) (-92, -10.5526, 1.5) (-87.9282, 4.5, 1.5) (-100.0526, -2.5, 1.5)
fillet "フィレット2" radius 13 2 edges at (-59.0911, 17, 1.5) (-59.0911, 0, 1.5)
fillet "フィレット3" radius 5 2 edges at (0, 17, 1.5) (0, 0, 1.5)
sketch "スケッチ9" plane through (0, 0, 3) normal (0, 0, 1) x (1, 0, 0)
  line L0 (-51.5042, 0) -> (-5, 0) projected
  line L1 (-27.5, 0) -> (-27.5, 17)
  line L2 (-5, 17) -> (-51.5042, 17) projected
  line L3 (-47.5, 0) -> (-47.5, 17)
  line L4 (0, 5) -> (0, 12) projected
  point P0 (0, 0)
  point P1 (-47.5, 17)
  point P2 (-47.5, 0)
  dimension "d90" = 27.5
  dimension "d91" = 20
extrude "押し出し6" cut sketch "スケッチ9" against normal blind 1.5
properties part number "link2plate4" material "アルミニウム 6061"
